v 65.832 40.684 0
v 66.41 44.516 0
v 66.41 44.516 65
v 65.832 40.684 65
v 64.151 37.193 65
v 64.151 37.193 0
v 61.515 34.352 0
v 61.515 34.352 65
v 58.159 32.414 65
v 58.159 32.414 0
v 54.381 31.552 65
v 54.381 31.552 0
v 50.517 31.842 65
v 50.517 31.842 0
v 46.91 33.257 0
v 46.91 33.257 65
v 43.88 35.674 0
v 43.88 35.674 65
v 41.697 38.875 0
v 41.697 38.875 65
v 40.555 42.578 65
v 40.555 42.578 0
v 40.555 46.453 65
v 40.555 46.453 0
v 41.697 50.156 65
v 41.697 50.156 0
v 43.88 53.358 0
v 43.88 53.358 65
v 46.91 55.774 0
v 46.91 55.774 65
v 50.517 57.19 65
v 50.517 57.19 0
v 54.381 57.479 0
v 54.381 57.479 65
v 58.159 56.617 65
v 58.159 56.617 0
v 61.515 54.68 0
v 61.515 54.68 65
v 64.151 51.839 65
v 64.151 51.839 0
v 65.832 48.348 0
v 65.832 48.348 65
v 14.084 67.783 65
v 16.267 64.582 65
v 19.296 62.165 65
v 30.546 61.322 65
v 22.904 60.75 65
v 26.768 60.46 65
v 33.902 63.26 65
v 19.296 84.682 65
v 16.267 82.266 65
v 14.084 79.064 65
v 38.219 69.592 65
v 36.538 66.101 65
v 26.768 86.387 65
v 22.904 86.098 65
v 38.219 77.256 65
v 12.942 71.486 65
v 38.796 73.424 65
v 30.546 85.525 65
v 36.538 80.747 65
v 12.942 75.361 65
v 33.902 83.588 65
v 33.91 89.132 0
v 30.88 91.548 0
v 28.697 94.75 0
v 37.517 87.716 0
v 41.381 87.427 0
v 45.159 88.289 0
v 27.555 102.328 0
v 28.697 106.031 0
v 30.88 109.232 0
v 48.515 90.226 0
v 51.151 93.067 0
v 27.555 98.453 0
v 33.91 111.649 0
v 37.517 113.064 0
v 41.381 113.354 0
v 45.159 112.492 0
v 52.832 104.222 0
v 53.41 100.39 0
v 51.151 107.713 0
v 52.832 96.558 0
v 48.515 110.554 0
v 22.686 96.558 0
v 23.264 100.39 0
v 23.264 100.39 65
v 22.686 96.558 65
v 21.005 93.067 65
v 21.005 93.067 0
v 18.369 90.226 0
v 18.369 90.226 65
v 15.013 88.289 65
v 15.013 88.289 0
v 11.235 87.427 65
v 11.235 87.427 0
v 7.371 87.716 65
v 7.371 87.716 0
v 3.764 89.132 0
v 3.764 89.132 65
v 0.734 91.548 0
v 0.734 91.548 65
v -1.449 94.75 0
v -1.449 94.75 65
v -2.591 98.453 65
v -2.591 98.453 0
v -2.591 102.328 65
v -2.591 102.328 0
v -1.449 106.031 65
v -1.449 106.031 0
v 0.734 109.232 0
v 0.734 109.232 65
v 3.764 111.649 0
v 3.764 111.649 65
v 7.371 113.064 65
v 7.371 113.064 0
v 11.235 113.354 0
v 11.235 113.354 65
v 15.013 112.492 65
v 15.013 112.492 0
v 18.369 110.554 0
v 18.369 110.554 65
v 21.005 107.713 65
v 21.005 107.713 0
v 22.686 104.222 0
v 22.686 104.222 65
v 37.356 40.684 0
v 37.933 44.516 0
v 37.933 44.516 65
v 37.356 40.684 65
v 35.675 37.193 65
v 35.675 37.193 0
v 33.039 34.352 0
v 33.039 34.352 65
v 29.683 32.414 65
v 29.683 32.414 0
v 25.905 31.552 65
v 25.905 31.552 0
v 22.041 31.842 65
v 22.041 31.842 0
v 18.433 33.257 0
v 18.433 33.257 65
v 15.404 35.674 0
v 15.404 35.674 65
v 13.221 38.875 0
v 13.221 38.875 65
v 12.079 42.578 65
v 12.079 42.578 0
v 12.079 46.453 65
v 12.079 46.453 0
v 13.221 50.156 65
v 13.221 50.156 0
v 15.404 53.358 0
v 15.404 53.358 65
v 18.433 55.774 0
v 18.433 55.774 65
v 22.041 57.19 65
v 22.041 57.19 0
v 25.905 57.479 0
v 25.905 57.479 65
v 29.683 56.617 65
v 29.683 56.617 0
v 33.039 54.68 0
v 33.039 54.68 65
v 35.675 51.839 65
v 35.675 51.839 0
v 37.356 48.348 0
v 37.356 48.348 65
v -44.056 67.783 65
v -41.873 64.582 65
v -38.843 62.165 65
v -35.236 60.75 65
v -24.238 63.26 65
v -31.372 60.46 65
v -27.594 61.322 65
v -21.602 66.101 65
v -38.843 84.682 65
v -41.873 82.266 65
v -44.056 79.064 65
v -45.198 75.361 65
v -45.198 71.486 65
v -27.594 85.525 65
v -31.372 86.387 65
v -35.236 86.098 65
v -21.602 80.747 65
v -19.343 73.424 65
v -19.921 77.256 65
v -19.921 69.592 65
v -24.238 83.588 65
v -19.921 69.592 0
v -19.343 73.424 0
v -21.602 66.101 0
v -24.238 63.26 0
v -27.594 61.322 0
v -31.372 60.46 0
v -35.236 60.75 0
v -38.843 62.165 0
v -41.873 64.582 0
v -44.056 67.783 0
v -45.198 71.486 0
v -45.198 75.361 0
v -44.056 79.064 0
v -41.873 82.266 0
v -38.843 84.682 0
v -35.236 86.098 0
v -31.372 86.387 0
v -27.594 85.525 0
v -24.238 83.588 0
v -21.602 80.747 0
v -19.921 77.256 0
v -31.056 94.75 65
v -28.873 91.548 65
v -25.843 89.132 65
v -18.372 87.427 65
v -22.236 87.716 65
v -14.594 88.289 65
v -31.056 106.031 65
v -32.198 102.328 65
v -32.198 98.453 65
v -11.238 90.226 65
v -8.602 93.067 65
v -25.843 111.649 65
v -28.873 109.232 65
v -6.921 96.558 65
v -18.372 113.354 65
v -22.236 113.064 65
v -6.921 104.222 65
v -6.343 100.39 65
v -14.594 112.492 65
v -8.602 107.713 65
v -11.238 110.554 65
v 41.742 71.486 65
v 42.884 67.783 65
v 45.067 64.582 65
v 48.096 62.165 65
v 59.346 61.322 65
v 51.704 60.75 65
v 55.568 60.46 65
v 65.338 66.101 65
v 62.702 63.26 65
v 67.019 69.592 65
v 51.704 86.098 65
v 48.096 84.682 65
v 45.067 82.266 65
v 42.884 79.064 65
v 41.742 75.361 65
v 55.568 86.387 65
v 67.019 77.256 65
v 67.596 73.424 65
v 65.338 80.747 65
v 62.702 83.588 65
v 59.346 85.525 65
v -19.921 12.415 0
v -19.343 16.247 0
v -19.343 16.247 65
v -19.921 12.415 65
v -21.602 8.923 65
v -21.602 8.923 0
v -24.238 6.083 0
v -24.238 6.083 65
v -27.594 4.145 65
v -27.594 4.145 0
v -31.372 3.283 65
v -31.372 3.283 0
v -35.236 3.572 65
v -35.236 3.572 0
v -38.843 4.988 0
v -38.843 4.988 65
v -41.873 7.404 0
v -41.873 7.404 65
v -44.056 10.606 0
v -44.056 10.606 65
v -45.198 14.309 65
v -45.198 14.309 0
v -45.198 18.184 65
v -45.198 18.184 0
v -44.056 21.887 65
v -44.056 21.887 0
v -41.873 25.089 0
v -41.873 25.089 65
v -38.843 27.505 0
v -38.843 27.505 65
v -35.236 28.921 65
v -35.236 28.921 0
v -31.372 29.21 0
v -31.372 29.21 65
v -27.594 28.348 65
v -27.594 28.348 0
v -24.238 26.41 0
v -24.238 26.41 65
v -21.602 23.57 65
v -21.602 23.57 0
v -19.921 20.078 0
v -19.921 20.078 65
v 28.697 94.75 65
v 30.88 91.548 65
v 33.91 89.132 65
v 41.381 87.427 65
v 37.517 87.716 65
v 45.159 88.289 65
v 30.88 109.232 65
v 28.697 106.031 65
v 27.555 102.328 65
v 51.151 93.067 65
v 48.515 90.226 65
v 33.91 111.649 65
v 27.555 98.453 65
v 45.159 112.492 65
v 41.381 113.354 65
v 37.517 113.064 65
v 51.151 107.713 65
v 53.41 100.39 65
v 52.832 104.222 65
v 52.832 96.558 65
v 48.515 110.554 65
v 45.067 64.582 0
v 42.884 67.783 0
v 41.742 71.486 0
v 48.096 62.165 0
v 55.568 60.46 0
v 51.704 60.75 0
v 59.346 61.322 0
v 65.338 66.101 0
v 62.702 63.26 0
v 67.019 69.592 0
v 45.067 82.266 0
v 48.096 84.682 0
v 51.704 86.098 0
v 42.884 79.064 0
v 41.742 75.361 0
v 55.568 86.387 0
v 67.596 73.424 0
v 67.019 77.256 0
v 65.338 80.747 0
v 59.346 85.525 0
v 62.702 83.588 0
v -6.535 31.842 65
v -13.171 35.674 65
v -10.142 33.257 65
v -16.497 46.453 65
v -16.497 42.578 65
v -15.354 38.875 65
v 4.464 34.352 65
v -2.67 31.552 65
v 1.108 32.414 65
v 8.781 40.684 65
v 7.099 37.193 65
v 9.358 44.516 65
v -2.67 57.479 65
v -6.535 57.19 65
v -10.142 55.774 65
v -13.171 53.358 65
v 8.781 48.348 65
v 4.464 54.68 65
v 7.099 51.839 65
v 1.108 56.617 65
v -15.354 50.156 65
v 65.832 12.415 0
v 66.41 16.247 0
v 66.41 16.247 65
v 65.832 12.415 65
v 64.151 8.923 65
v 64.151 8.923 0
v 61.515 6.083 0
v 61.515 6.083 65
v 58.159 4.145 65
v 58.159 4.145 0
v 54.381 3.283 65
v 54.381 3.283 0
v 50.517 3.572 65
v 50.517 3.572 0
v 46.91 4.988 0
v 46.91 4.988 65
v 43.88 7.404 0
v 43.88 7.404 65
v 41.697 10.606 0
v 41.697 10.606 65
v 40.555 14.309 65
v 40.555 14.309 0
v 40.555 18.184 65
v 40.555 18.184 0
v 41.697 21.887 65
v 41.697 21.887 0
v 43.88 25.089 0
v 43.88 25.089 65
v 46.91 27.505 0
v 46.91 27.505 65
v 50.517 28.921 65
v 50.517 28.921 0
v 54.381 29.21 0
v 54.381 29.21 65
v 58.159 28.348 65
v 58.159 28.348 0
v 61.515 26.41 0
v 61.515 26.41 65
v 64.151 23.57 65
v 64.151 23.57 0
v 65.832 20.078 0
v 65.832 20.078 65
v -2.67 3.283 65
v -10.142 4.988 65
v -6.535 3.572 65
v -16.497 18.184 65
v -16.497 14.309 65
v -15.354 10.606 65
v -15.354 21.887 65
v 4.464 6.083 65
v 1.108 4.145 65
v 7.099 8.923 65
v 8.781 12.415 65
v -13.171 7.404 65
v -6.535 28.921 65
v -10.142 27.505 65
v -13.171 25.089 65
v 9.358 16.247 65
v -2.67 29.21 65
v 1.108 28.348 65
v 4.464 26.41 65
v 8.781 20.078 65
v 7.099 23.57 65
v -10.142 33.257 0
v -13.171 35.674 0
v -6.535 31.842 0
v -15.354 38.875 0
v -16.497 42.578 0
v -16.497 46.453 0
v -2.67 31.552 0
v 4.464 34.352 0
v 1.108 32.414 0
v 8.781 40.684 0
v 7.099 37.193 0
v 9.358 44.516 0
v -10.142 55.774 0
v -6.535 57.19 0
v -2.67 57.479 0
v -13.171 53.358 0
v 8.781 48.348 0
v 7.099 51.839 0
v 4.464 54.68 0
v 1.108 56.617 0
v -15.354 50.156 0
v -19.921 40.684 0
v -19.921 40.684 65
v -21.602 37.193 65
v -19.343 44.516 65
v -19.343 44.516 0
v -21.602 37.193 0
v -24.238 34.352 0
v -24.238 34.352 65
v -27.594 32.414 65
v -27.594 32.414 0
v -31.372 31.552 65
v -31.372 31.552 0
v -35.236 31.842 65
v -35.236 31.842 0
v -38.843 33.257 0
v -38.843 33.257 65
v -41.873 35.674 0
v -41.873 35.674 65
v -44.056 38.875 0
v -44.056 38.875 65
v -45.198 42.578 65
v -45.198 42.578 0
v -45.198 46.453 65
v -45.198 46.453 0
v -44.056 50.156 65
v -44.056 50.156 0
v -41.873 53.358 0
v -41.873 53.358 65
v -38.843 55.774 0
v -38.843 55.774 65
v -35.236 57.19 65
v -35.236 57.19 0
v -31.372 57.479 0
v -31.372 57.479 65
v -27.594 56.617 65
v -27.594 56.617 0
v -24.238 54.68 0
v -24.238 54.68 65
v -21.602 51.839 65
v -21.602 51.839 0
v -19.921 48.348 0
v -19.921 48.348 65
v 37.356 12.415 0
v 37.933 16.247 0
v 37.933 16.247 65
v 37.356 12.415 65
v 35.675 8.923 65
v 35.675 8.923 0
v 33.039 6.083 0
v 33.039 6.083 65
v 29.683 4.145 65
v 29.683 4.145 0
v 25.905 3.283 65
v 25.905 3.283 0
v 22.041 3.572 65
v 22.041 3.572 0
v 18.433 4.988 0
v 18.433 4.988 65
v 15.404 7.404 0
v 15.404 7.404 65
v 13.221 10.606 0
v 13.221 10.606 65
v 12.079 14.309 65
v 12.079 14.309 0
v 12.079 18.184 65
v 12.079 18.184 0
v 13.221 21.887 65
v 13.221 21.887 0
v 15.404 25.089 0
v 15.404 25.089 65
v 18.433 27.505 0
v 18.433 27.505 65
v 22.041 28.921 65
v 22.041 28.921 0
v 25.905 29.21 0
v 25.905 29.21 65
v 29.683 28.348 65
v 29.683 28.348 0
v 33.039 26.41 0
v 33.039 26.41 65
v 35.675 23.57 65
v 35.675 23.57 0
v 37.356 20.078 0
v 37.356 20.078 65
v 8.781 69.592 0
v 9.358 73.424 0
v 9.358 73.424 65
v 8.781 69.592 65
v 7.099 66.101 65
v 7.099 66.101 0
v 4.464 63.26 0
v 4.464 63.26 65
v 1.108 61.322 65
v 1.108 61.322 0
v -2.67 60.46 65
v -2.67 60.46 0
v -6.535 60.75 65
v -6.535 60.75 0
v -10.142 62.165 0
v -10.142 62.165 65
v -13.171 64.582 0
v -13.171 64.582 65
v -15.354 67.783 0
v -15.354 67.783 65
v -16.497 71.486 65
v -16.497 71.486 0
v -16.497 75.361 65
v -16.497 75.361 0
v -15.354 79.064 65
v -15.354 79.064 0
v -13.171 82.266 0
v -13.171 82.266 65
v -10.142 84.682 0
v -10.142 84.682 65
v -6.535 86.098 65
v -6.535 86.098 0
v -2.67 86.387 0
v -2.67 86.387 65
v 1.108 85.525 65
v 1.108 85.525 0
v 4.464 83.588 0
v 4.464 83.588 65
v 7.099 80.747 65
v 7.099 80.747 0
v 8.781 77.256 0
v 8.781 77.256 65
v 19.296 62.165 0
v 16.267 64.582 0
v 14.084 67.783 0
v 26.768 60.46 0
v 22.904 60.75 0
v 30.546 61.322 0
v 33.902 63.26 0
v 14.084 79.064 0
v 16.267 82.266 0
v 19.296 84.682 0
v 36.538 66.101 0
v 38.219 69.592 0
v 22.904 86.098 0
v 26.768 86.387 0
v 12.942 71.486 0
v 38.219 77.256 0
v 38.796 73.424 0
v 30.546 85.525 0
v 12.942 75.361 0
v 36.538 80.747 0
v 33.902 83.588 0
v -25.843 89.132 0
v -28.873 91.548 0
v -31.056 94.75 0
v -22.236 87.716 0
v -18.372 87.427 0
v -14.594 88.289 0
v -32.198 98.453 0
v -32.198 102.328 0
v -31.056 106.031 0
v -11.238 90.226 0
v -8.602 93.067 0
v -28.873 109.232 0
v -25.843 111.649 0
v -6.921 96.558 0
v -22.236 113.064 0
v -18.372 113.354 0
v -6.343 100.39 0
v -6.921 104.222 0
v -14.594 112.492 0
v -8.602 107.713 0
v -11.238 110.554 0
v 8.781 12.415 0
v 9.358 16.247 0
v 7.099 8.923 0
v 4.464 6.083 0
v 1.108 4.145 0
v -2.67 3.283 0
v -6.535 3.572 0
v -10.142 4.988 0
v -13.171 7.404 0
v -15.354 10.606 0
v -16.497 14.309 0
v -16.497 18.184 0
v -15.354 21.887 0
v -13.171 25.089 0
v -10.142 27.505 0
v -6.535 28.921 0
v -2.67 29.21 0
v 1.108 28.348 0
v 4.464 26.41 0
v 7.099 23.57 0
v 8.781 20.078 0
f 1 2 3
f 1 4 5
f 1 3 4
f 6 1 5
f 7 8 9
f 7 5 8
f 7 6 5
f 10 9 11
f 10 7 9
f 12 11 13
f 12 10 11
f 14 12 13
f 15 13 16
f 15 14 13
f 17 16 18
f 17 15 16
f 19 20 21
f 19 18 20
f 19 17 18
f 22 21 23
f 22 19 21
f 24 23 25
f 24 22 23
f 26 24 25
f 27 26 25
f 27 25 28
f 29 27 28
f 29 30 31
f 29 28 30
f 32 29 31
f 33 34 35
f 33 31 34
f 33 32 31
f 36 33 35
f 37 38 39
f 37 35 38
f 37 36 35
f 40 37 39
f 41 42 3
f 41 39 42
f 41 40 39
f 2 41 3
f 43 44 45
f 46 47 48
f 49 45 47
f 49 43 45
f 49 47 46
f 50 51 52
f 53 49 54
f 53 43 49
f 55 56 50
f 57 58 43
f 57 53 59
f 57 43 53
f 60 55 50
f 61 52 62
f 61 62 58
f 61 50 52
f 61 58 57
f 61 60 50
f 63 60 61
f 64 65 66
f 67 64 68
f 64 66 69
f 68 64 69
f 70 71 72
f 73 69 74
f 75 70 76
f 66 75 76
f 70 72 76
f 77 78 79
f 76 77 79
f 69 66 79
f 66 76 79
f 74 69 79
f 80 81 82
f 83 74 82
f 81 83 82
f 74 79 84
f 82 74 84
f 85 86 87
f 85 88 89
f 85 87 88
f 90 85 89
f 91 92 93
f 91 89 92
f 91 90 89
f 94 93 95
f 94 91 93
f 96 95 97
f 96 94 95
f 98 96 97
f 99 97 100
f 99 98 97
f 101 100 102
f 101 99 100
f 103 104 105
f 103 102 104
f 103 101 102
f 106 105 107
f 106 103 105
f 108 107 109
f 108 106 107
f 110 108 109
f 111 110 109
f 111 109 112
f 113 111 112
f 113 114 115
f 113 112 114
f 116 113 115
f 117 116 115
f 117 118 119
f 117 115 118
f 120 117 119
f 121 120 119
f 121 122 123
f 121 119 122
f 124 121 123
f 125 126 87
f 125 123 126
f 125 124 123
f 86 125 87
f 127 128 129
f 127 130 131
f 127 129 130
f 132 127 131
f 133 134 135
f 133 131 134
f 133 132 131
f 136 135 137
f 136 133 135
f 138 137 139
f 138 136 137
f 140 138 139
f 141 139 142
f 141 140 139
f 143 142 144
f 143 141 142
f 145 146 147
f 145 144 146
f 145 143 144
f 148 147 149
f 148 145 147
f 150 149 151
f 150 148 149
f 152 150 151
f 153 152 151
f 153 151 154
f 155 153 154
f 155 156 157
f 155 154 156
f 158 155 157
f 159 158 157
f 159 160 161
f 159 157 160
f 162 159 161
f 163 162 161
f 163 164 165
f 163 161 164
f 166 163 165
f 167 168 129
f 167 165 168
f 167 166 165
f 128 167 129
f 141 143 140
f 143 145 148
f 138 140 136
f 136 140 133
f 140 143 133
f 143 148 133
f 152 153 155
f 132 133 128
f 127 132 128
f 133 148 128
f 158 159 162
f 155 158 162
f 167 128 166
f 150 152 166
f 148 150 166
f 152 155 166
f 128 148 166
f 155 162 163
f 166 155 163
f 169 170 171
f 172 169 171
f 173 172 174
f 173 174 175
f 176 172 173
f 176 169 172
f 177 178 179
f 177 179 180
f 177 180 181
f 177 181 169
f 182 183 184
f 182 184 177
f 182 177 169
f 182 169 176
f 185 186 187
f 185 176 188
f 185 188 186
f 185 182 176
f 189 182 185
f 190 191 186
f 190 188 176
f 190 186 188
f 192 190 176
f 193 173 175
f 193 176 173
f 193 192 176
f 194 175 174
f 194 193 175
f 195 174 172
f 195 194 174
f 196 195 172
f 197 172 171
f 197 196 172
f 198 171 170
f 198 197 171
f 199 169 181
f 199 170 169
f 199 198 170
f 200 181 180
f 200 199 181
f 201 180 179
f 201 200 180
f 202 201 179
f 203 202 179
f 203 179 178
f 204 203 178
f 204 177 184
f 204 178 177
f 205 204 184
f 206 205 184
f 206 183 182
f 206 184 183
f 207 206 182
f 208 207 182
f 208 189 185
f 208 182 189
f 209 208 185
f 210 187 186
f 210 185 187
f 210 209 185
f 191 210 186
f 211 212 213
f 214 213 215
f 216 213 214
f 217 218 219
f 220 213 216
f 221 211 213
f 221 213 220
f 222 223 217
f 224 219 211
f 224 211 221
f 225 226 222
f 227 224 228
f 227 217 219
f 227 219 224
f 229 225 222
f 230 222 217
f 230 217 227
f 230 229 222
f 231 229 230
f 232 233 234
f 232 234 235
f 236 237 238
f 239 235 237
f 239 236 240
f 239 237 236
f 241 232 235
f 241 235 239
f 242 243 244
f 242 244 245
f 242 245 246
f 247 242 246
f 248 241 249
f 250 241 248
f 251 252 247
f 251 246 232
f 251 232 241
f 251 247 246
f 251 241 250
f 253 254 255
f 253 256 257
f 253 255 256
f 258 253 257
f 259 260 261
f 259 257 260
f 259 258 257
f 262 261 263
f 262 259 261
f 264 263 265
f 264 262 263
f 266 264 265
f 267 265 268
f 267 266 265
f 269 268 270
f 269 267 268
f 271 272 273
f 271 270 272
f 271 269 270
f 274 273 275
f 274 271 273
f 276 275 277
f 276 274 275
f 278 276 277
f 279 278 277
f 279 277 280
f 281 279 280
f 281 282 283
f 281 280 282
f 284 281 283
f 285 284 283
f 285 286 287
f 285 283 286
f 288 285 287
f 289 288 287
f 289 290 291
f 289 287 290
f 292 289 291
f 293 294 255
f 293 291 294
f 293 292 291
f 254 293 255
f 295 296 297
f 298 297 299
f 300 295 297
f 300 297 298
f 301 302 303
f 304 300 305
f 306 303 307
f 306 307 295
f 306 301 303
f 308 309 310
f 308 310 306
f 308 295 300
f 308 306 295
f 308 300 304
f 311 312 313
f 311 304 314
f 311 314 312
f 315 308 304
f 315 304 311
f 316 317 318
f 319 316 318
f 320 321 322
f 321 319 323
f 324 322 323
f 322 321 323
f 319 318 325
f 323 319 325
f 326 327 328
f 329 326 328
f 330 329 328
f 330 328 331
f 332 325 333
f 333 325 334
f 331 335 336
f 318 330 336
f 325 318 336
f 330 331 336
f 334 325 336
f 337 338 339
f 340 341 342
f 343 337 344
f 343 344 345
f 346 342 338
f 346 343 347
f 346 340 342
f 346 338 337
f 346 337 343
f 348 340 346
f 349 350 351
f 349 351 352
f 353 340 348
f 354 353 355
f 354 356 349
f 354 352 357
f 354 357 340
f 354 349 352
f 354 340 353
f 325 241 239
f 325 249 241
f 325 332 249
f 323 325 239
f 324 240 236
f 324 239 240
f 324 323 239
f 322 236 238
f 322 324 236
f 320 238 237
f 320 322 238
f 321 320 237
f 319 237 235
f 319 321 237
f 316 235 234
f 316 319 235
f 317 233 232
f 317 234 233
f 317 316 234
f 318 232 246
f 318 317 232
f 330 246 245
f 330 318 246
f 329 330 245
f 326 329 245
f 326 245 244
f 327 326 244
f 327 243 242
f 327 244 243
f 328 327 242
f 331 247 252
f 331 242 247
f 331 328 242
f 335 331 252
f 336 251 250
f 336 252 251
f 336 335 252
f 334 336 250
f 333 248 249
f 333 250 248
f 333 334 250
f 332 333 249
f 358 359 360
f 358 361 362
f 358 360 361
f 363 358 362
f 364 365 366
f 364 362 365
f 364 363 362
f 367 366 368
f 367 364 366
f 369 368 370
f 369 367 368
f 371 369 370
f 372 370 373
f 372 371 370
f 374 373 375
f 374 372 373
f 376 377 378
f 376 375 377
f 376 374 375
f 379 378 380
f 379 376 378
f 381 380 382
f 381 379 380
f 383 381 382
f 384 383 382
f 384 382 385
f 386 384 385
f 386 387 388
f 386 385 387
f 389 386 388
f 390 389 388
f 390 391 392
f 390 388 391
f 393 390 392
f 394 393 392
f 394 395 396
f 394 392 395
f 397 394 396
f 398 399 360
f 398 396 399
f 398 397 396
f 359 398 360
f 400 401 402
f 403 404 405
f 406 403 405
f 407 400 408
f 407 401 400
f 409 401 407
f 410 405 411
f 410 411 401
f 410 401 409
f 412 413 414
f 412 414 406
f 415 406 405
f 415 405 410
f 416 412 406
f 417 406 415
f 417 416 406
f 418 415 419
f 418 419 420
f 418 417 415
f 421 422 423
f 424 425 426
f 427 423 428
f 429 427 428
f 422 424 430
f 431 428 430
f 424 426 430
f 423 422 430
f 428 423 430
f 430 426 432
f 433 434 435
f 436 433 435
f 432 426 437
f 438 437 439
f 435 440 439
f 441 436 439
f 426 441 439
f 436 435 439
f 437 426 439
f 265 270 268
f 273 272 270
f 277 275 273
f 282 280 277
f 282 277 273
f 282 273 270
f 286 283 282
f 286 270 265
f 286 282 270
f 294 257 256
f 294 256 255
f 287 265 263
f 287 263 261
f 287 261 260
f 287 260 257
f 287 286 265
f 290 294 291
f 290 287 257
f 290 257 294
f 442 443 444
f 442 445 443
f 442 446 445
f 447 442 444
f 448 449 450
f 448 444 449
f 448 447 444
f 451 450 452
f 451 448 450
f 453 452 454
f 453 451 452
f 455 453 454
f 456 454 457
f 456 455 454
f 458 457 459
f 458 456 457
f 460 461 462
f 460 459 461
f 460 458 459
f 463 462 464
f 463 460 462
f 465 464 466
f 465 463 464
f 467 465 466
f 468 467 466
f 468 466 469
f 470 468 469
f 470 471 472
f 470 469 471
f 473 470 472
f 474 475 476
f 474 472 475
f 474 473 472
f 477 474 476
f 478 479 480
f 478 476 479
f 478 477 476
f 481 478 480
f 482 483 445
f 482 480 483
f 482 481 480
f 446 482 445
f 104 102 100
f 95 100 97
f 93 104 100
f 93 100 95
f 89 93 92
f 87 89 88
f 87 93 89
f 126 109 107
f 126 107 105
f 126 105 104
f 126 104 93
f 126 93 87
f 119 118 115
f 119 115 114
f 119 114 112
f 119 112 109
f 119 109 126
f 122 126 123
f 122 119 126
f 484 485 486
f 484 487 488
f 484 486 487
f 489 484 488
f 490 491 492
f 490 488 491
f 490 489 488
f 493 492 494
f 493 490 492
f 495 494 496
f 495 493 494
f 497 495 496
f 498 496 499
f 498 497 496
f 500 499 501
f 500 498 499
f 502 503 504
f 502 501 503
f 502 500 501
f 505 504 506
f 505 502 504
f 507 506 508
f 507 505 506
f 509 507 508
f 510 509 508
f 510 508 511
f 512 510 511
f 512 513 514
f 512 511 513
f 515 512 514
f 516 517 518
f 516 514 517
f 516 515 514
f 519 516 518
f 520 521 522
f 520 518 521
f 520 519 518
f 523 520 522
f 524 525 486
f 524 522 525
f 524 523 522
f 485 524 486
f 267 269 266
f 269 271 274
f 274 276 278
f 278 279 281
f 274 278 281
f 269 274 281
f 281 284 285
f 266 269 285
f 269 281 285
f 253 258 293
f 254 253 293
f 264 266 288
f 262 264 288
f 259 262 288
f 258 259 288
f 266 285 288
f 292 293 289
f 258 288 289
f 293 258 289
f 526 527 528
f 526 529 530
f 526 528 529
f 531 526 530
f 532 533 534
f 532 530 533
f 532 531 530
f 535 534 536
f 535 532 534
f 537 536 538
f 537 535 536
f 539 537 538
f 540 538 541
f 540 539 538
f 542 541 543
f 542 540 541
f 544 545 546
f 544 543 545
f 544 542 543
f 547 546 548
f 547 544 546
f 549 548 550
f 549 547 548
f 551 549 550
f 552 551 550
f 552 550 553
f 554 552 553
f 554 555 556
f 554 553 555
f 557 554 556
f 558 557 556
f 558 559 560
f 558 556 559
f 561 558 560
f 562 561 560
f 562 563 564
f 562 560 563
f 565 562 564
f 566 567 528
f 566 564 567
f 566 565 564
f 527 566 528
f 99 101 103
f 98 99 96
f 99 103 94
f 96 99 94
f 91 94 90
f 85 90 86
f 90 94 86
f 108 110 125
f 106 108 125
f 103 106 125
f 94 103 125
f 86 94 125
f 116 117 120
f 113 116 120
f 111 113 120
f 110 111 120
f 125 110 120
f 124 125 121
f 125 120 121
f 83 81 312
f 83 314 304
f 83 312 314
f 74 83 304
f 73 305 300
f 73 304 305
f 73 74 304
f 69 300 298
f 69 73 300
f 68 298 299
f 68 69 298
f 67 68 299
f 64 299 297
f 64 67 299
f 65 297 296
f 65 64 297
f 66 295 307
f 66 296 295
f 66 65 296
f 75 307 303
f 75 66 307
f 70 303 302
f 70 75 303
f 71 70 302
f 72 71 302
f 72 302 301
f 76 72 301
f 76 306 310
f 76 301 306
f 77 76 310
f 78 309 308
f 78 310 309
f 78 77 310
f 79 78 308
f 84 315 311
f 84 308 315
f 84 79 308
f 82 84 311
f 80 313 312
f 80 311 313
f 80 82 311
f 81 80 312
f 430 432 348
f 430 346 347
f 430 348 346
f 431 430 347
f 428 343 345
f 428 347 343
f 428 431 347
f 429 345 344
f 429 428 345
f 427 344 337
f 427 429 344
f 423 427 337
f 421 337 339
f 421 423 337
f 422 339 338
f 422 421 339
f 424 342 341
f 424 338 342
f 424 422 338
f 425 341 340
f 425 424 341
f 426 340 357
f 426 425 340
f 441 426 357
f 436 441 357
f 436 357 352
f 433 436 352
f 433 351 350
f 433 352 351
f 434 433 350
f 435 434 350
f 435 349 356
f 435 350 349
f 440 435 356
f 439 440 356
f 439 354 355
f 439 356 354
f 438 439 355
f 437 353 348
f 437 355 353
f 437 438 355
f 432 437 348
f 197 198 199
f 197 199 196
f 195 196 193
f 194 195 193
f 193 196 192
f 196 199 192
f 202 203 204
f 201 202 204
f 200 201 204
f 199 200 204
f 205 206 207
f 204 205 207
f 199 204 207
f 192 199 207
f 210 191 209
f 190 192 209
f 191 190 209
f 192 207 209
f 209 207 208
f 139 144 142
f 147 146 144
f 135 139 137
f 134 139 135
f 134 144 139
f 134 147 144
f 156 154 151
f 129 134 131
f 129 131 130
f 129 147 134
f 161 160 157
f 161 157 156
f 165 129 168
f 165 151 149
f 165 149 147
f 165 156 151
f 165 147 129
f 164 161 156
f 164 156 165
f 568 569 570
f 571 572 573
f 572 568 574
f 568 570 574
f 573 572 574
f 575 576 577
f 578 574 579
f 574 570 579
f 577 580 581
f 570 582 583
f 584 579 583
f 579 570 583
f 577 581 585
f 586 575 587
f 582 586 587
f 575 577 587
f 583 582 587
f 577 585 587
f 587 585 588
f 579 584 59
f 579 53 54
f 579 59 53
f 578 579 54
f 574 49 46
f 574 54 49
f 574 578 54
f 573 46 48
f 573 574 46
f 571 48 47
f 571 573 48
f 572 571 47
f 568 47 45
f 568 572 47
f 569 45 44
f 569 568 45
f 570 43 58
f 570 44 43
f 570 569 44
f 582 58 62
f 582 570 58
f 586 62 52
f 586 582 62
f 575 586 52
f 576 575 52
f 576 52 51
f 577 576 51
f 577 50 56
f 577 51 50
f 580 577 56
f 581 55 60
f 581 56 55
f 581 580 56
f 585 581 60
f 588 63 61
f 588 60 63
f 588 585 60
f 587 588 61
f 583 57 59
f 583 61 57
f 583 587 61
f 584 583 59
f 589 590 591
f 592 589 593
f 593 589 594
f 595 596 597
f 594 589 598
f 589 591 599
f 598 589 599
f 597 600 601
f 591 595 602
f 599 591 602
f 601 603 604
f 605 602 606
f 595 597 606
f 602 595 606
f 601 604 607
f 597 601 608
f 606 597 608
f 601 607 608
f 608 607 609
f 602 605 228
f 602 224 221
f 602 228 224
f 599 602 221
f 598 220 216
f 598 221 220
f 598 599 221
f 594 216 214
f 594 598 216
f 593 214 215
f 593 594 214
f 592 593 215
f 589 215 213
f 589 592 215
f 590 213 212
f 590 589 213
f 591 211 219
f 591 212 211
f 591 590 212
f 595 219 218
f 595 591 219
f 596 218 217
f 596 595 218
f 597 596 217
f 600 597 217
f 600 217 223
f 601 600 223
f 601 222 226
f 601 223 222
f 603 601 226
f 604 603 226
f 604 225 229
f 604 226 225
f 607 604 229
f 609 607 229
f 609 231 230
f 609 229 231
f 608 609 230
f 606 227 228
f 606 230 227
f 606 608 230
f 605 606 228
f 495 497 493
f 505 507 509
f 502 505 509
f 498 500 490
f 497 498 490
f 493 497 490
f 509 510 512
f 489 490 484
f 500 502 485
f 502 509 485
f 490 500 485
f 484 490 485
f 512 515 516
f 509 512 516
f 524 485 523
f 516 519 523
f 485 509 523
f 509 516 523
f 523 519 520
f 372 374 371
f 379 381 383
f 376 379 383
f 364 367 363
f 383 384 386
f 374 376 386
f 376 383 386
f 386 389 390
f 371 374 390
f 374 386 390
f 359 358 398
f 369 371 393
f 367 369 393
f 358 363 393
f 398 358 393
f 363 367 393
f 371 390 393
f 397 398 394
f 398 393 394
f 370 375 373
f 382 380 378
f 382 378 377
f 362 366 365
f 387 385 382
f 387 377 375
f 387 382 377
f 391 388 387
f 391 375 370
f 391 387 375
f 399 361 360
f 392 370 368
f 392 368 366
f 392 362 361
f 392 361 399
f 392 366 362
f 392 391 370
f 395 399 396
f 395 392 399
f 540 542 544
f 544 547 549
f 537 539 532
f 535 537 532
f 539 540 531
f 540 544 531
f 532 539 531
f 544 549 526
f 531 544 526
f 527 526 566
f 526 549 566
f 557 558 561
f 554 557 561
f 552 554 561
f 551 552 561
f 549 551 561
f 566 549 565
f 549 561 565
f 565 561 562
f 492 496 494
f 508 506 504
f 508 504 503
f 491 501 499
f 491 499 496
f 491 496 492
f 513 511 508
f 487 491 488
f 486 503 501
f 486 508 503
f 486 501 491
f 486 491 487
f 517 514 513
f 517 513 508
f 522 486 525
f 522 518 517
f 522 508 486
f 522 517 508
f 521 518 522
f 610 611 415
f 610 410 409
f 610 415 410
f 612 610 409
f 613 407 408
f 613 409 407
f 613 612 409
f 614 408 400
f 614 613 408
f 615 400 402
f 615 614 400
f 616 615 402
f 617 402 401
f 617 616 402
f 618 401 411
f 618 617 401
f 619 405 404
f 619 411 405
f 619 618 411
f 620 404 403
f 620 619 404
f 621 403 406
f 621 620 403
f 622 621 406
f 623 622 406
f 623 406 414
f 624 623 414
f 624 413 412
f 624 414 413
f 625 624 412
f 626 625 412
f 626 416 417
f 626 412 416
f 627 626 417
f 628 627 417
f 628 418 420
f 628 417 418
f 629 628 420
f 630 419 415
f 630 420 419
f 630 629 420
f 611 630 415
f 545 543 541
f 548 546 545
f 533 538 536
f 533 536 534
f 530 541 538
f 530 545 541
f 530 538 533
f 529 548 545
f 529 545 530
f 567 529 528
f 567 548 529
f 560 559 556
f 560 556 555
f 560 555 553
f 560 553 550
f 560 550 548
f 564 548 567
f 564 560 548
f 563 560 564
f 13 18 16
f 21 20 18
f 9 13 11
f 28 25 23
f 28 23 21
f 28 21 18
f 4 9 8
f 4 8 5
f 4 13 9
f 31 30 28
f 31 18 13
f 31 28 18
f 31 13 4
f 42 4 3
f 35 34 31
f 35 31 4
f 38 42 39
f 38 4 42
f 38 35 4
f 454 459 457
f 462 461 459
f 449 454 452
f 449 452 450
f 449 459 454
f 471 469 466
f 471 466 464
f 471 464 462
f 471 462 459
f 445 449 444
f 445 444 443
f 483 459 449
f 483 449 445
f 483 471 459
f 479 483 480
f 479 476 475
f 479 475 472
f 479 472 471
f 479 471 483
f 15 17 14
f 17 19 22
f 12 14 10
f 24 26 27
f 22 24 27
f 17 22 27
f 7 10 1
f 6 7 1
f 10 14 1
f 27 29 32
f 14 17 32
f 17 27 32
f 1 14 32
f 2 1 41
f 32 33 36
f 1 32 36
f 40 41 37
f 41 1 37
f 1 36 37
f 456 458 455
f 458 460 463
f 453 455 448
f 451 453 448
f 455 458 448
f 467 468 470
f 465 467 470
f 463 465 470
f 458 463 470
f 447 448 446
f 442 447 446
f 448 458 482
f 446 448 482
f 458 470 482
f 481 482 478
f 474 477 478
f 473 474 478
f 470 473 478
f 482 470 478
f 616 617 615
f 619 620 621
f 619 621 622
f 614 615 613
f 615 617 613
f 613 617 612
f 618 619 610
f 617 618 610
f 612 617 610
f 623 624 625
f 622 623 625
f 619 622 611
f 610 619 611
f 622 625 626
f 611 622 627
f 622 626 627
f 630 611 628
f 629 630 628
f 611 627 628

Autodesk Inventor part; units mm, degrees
ref_plane "YZ Plane" through (0, 0, 0) normal (1, 0, 0) x (0, 1, 0)
ref_plane "XZ Plane" through (0, 0, 0) normal (0, 1, 0) x (-1, 0, 0)
ref_plane "XY Plane" through (0, 0, 0) normal (0, 0, 1) x (1, 0, 0)
sketch "Sketch1" plane through (0, 0, 0) normal (0, 0, 1) x (1, 0, 0)
  circle A0 centre (-32.3432, 16.2465) radius 13
  circle A1 centre (-3.6418, 16.2465) radius 13
  circle A2 centre (24.9334, 16.2465) radius 13
  circle A3 centre (53.41, 16.2465) radius 13
  circle A4 centre (-32.3432, 44.5158) radius 13
  circle A5 centre (-3.6418, 44.5158) radius 13
  circle A6 centre (24.9334, 44.5158) radius 13
  circle A7 centre (53.41, 44.5158) radius 13
  circle A8 centre (-3.6418, 73.4238) radius 13
  circle A9 centre (10.2637, 100.3902) radius 13
  circle A10 centre (40.41, 100.3902) radius 13
  circle A11 centre (-32.3432, 73.4238) radius 13
  circle A12 centre (25.7964, 73.4238) radius 13
  circle A13 centre (54.5965, 73.4238) radius 13
  circle A14 centre (-19.3432, 100.3902) radius 13
  point P0 (0, 0)
  dimension "d0" = 26
  dimension "d2" = 26
  dimension "d4" = 26
  dimension "d17" = 26
  dimension "d19" = 26
  dimension "d20" = 26
  dimension "d21" = 26
  dimension "d22" = 26
  dimension "d24" = 26
  dimension "d25" = 26
  dimension "d26" = 26
  dimension "d28" = 26
  dimension "d29" = 26
  dimension "d30" = 26
  dimension "d31" = 26
extrude "Extrusion1" add sketch "Sketch1" along normal blind 65
equation "\"d2\" = d0"
equation "\"d4\" = d0"
properties part number "battery_case"
